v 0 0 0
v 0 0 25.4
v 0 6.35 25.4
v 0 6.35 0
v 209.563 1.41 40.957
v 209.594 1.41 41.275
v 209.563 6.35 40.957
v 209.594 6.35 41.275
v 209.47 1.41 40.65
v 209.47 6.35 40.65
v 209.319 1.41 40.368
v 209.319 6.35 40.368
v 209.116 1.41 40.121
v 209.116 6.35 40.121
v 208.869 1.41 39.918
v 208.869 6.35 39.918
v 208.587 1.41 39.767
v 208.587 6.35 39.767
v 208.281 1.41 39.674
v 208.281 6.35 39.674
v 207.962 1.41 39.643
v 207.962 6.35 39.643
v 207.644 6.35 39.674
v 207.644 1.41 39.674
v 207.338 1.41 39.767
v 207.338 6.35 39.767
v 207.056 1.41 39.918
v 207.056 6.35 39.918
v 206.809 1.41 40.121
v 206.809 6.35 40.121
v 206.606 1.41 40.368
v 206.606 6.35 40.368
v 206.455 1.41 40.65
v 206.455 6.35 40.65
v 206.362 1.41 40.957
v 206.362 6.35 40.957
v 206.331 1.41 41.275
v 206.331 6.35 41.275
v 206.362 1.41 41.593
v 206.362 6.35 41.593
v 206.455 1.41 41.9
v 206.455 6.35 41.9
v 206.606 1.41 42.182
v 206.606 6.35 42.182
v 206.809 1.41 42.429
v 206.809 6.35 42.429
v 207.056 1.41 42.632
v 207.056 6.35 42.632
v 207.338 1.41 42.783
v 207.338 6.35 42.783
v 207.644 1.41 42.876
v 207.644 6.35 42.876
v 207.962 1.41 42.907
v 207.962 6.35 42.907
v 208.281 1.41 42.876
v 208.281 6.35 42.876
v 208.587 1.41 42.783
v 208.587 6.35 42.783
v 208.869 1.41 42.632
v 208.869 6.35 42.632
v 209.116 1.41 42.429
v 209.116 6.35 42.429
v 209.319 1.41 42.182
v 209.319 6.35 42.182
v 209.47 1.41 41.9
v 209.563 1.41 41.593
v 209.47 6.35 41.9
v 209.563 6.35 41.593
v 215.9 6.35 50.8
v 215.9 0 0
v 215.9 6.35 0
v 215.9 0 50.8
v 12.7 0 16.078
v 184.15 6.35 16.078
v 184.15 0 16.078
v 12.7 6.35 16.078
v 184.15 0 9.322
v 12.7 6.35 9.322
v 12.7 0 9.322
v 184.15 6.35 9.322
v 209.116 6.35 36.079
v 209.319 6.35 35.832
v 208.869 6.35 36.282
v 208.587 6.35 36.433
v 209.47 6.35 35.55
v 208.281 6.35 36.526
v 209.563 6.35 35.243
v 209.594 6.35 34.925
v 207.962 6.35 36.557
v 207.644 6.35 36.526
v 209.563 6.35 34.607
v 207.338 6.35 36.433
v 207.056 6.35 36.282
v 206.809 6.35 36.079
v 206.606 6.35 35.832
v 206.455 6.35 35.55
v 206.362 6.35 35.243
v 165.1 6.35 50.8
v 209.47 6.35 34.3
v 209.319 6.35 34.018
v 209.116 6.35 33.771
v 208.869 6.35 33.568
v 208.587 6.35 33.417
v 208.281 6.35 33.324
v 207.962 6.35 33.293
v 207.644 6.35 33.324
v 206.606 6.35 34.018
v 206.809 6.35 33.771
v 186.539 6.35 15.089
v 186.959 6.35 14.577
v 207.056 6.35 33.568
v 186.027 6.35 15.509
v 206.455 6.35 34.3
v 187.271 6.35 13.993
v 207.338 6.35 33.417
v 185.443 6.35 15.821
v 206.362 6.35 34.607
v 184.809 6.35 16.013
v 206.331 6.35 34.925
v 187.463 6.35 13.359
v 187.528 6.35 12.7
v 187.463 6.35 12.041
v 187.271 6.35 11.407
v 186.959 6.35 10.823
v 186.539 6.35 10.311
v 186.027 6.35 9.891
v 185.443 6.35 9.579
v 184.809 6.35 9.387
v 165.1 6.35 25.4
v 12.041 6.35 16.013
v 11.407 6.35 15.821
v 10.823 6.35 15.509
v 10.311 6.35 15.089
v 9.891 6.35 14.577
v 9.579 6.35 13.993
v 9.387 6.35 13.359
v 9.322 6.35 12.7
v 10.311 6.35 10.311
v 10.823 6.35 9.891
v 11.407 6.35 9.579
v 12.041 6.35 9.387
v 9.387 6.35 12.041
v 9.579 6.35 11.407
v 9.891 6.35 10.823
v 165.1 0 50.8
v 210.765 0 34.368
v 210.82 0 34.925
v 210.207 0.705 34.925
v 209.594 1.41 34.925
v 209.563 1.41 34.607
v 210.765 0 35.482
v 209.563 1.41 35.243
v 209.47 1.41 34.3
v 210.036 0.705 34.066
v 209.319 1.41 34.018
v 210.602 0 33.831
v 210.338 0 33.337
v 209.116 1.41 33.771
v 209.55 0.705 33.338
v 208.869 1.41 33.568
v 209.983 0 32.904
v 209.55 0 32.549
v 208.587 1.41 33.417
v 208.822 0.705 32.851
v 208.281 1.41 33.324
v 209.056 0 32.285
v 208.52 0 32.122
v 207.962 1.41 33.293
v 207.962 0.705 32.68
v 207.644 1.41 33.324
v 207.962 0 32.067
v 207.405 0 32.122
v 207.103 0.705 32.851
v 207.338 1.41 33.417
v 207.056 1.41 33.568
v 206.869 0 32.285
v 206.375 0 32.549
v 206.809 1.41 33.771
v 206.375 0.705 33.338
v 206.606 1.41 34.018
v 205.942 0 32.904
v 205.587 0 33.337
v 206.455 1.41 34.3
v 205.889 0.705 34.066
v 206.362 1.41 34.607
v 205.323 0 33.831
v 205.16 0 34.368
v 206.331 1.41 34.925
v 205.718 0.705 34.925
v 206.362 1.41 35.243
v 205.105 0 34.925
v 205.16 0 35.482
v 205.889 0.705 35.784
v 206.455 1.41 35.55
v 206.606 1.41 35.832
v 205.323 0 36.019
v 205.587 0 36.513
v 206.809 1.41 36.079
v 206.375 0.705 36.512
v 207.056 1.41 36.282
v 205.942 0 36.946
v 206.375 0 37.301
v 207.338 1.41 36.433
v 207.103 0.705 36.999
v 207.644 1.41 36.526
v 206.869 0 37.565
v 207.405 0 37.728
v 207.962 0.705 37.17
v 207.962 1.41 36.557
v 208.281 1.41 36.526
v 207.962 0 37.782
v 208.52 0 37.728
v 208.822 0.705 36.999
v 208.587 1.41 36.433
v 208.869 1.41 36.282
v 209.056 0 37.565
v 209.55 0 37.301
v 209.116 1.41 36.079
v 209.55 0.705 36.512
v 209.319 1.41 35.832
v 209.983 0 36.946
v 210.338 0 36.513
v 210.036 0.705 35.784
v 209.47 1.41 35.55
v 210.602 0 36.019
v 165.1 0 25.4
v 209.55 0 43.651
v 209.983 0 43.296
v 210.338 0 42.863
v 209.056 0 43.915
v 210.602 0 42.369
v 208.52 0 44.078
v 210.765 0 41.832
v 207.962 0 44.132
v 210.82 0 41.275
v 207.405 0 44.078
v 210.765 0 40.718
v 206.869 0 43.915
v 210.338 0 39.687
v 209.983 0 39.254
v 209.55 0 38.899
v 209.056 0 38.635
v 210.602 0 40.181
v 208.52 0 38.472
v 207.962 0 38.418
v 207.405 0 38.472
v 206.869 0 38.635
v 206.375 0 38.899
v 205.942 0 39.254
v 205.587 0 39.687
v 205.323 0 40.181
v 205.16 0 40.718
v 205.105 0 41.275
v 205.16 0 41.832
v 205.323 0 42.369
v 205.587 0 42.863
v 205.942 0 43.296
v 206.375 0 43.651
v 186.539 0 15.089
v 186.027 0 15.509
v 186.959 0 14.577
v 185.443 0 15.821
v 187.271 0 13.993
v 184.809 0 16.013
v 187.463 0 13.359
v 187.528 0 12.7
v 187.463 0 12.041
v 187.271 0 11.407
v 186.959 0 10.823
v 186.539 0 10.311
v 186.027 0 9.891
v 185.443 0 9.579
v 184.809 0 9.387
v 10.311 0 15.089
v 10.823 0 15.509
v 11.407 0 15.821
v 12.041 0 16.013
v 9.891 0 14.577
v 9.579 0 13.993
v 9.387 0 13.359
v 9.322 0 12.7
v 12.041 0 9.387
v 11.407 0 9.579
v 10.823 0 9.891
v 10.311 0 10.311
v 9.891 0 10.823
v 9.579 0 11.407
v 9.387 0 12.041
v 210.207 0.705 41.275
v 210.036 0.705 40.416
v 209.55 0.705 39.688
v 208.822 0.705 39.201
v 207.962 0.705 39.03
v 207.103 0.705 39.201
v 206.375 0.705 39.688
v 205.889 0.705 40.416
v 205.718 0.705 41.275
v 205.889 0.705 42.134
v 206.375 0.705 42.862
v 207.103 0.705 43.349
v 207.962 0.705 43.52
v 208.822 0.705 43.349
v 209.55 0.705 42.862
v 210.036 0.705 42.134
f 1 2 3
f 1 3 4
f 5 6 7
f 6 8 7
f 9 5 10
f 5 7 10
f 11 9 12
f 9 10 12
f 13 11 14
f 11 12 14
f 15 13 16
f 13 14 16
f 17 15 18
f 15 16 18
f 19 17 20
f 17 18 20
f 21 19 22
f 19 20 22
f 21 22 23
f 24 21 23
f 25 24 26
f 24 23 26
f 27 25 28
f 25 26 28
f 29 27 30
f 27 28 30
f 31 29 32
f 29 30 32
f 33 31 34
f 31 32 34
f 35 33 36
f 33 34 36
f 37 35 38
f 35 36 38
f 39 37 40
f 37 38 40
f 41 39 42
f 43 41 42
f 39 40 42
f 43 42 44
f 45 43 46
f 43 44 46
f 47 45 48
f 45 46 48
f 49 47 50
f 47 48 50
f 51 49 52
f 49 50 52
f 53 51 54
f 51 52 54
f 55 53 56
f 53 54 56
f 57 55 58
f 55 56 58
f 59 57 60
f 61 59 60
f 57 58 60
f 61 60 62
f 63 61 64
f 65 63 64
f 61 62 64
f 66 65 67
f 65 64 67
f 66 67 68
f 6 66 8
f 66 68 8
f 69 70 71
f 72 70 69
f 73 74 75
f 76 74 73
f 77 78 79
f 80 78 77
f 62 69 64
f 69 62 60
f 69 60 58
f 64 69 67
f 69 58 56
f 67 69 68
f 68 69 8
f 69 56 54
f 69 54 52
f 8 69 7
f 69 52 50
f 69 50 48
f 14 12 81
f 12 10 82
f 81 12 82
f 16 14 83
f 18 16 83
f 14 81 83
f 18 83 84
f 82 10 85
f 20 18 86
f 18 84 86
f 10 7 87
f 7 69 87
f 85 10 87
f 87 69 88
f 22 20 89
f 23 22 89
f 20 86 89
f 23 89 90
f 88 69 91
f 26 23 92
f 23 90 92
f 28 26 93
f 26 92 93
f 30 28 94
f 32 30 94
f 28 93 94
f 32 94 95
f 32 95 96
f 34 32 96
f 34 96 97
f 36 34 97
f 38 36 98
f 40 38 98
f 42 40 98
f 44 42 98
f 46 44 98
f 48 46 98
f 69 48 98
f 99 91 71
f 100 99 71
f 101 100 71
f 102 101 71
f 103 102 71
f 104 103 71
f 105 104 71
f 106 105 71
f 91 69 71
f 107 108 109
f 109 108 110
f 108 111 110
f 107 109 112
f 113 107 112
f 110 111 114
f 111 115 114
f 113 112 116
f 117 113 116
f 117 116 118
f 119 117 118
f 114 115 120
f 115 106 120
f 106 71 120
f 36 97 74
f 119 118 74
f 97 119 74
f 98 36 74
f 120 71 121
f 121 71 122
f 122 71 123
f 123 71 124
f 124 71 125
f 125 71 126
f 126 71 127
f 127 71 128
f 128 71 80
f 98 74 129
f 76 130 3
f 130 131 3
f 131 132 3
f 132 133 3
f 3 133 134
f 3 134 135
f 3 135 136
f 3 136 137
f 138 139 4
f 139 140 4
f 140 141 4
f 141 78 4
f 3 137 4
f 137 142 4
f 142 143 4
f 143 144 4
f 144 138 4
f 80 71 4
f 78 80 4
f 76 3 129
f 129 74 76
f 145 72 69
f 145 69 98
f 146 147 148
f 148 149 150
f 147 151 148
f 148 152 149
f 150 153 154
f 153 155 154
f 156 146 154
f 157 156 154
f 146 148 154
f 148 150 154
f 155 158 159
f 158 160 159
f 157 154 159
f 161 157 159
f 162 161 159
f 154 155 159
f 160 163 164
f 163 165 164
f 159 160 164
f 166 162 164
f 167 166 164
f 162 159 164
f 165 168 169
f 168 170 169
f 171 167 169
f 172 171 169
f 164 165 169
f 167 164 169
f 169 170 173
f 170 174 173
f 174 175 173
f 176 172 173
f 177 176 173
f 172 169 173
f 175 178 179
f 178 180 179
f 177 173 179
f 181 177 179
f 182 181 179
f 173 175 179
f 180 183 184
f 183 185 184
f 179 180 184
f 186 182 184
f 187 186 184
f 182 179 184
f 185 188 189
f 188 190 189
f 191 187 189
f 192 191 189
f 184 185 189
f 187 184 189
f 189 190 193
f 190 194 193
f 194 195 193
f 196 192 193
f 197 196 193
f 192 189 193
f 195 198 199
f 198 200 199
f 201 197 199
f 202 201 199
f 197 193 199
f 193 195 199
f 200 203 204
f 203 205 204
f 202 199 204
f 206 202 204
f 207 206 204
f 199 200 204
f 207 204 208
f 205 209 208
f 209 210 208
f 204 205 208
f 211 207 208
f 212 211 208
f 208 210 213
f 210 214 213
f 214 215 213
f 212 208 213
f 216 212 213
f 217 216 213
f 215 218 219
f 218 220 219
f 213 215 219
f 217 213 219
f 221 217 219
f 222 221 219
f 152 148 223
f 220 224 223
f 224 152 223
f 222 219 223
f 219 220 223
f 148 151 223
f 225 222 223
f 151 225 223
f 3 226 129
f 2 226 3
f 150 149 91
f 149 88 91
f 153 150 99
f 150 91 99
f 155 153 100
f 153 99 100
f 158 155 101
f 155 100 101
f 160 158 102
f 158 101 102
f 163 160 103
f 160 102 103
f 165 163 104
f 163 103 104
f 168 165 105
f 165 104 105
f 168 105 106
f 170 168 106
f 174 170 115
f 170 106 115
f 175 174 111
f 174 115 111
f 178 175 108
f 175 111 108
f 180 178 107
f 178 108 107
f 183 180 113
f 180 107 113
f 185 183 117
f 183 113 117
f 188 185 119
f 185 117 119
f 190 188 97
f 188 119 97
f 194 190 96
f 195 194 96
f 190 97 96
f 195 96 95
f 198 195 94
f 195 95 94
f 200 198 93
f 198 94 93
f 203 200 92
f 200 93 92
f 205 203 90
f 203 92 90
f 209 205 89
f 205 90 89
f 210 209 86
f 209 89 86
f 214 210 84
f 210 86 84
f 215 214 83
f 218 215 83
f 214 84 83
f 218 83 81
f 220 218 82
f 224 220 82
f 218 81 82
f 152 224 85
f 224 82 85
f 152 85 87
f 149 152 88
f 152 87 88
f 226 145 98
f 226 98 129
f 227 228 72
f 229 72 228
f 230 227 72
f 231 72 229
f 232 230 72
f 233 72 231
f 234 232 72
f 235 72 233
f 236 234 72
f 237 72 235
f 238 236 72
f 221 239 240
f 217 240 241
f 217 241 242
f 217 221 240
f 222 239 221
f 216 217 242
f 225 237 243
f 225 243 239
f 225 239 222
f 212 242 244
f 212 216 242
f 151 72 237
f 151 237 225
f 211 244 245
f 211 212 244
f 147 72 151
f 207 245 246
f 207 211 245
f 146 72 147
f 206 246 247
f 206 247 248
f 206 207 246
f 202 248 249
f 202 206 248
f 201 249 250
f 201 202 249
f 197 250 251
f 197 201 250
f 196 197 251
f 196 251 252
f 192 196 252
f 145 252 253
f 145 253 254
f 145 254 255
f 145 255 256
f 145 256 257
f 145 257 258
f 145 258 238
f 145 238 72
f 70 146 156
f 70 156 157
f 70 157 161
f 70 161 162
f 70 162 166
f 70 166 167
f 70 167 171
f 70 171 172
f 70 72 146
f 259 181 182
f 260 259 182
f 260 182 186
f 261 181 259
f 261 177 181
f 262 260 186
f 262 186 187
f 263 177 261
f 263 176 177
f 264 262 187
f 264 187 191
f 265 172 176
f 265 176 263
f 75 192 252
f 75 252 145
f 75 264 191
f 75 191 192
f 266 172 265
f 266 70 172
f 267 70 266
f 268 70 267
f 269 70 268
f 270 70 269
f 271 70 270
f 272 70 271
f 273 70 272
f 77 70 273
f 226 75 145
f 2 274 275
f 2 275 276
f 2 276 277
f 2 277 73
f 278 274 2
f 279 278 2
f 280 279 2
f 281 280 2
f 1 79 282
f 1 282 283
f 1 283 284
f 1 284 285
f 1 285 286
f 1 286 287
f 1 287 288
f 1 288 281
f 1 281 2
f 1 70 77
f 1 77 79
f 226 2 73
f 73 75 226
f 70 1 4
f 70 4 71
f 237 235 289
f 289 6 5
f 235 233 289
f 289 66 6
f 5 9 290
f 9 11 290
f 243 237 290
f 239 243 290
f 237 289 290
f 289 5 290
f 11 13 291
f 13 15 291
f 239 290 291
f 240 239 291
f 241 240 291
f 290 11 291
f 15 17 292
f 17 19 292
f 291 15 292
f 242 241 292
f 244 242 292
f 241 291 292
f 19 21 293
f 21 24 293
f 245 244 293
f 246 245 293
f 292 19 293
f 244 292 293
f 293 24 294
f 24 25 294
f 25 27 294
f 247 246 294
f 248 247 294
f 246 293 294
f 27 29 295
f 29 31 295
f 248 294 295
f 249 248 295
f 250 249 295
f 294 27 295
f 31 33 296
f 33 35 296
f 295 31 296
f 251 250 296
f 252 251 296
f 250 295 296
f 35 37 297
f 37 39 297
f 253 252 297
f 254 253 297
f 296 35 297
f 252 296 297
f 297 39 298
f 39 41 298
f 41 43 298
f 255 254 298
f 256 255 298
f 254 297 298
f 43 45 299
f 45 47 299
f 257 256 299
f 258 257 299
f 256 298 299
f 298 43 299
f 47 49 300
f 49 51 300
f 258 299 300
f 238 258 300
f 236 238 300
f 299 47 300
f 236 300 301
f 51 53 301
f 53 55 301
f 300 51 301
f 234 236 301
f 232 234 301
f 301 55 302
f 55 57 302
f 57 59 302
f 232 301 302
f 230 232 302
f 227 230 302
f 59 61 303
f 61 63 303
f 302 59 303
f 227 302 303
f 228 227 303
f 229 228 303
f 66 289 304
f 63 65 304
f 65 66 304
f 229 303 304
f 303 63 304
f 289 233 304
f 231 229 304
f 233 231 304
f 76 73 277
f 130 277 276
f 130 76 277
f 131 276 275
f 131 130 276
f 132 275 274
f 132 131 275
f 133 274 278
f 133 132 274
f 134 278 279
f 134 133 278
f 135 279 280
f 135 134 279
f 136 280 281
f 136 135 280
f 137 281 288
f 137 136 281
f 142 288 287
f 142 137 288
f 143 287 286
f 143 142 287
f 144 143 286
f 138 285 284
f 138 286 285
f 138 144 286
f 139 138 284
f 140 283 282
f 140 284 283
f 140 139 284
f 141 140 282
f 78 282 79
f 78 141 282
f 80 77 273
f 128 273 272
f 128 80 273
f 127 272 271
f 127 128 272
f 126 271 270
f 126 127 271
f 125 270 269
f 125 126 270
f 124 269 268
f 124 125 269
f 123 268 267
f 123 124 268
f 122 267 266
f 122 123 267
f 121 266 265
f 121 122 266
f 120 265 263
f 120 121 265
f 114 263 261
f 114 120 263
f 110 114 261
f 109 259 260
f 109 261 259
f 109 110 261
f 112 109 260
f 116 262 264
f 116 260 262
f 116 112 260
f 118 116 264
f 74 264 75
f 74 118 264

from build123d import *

# Parameters (mm, degrees)
BOSS_EXTRUDE1_DEPTH                            = 6.35
CUT_EXTRUDE1_DEPTH                             = 222.886846163
CSK_FOR_4_FLAT_HEAD_MACHINE_SCREW1_D           = 3.2639
CSK_FOR_4_FLAT_HEAD_MACHINE_SCREW1_CSINK_D     = 5.715
CSK_FOR_4_FLAT_HEAD_MACHINE_SCREW1_CSINK_ANGLE = 82


with BuildPart() as part:
    # Sketch1 → Boss-Extrude1 (new body)
    with BuildSketch(Plane(origin=(0, 0, 0), x_dir=(1, 0, 0), z_dir=(0, 1, 0))):
        Polygon((0, 0), (215.9, 0), (215.9, -50.8), (165.1, -50.8), (165.1, -25.4), (0, -25.4), align=None)
    extrude(amount=BOSS_EXTRUDE1_DEPTH)

    # Sketch2 → Cut-Extrude1 (cut, through all)
    with BuildSketch(Plane(origin=(0, 6.35, 0), x_dir=(1, 0, 0), z_dir=(0, 1, 0))):
        with BuildLine():
            Line((184.15, -16.0782), (12.7, -16.0782))
            ThreePointArc((12.7, -16.0782), (9.3218, -12.7), (12.7, -9.3218))
            Line((12.7, -9.3218), (184.15, -9.3218))
            ThreePointArc((184.15, -9.3218), (187.5282, -12.7), (184.15, -16.0782))
        make_face()
    extrude(amount=-CUT_EXTRUDE1_DEPTH, mode=Mode.SUBTRACT)

    # CSK for #4 Flat Head Machine Screw1 (through all)
    with Locations(Plane(origin=(0, 0, 0), x_dir=(-1, 0, 0), z_dir=(0, -1, 0))):
        with Locations((-207.9625, -34.925), (-207.9625, -41.275)):
            CounterSinkHole(CSK_FOR_4_FLAT_HEAD_MACHINE_SCREW1_D / 2, CSK_FOR_4_FLAT_HEAD_MACHINE_SCREW1_CSINK_D / 2, counter_sink_angle=CSK_FOR_4_FLAT_HEAD_MACHINE_SCREW1_CSINK_ANGLE)


solid = part.part
